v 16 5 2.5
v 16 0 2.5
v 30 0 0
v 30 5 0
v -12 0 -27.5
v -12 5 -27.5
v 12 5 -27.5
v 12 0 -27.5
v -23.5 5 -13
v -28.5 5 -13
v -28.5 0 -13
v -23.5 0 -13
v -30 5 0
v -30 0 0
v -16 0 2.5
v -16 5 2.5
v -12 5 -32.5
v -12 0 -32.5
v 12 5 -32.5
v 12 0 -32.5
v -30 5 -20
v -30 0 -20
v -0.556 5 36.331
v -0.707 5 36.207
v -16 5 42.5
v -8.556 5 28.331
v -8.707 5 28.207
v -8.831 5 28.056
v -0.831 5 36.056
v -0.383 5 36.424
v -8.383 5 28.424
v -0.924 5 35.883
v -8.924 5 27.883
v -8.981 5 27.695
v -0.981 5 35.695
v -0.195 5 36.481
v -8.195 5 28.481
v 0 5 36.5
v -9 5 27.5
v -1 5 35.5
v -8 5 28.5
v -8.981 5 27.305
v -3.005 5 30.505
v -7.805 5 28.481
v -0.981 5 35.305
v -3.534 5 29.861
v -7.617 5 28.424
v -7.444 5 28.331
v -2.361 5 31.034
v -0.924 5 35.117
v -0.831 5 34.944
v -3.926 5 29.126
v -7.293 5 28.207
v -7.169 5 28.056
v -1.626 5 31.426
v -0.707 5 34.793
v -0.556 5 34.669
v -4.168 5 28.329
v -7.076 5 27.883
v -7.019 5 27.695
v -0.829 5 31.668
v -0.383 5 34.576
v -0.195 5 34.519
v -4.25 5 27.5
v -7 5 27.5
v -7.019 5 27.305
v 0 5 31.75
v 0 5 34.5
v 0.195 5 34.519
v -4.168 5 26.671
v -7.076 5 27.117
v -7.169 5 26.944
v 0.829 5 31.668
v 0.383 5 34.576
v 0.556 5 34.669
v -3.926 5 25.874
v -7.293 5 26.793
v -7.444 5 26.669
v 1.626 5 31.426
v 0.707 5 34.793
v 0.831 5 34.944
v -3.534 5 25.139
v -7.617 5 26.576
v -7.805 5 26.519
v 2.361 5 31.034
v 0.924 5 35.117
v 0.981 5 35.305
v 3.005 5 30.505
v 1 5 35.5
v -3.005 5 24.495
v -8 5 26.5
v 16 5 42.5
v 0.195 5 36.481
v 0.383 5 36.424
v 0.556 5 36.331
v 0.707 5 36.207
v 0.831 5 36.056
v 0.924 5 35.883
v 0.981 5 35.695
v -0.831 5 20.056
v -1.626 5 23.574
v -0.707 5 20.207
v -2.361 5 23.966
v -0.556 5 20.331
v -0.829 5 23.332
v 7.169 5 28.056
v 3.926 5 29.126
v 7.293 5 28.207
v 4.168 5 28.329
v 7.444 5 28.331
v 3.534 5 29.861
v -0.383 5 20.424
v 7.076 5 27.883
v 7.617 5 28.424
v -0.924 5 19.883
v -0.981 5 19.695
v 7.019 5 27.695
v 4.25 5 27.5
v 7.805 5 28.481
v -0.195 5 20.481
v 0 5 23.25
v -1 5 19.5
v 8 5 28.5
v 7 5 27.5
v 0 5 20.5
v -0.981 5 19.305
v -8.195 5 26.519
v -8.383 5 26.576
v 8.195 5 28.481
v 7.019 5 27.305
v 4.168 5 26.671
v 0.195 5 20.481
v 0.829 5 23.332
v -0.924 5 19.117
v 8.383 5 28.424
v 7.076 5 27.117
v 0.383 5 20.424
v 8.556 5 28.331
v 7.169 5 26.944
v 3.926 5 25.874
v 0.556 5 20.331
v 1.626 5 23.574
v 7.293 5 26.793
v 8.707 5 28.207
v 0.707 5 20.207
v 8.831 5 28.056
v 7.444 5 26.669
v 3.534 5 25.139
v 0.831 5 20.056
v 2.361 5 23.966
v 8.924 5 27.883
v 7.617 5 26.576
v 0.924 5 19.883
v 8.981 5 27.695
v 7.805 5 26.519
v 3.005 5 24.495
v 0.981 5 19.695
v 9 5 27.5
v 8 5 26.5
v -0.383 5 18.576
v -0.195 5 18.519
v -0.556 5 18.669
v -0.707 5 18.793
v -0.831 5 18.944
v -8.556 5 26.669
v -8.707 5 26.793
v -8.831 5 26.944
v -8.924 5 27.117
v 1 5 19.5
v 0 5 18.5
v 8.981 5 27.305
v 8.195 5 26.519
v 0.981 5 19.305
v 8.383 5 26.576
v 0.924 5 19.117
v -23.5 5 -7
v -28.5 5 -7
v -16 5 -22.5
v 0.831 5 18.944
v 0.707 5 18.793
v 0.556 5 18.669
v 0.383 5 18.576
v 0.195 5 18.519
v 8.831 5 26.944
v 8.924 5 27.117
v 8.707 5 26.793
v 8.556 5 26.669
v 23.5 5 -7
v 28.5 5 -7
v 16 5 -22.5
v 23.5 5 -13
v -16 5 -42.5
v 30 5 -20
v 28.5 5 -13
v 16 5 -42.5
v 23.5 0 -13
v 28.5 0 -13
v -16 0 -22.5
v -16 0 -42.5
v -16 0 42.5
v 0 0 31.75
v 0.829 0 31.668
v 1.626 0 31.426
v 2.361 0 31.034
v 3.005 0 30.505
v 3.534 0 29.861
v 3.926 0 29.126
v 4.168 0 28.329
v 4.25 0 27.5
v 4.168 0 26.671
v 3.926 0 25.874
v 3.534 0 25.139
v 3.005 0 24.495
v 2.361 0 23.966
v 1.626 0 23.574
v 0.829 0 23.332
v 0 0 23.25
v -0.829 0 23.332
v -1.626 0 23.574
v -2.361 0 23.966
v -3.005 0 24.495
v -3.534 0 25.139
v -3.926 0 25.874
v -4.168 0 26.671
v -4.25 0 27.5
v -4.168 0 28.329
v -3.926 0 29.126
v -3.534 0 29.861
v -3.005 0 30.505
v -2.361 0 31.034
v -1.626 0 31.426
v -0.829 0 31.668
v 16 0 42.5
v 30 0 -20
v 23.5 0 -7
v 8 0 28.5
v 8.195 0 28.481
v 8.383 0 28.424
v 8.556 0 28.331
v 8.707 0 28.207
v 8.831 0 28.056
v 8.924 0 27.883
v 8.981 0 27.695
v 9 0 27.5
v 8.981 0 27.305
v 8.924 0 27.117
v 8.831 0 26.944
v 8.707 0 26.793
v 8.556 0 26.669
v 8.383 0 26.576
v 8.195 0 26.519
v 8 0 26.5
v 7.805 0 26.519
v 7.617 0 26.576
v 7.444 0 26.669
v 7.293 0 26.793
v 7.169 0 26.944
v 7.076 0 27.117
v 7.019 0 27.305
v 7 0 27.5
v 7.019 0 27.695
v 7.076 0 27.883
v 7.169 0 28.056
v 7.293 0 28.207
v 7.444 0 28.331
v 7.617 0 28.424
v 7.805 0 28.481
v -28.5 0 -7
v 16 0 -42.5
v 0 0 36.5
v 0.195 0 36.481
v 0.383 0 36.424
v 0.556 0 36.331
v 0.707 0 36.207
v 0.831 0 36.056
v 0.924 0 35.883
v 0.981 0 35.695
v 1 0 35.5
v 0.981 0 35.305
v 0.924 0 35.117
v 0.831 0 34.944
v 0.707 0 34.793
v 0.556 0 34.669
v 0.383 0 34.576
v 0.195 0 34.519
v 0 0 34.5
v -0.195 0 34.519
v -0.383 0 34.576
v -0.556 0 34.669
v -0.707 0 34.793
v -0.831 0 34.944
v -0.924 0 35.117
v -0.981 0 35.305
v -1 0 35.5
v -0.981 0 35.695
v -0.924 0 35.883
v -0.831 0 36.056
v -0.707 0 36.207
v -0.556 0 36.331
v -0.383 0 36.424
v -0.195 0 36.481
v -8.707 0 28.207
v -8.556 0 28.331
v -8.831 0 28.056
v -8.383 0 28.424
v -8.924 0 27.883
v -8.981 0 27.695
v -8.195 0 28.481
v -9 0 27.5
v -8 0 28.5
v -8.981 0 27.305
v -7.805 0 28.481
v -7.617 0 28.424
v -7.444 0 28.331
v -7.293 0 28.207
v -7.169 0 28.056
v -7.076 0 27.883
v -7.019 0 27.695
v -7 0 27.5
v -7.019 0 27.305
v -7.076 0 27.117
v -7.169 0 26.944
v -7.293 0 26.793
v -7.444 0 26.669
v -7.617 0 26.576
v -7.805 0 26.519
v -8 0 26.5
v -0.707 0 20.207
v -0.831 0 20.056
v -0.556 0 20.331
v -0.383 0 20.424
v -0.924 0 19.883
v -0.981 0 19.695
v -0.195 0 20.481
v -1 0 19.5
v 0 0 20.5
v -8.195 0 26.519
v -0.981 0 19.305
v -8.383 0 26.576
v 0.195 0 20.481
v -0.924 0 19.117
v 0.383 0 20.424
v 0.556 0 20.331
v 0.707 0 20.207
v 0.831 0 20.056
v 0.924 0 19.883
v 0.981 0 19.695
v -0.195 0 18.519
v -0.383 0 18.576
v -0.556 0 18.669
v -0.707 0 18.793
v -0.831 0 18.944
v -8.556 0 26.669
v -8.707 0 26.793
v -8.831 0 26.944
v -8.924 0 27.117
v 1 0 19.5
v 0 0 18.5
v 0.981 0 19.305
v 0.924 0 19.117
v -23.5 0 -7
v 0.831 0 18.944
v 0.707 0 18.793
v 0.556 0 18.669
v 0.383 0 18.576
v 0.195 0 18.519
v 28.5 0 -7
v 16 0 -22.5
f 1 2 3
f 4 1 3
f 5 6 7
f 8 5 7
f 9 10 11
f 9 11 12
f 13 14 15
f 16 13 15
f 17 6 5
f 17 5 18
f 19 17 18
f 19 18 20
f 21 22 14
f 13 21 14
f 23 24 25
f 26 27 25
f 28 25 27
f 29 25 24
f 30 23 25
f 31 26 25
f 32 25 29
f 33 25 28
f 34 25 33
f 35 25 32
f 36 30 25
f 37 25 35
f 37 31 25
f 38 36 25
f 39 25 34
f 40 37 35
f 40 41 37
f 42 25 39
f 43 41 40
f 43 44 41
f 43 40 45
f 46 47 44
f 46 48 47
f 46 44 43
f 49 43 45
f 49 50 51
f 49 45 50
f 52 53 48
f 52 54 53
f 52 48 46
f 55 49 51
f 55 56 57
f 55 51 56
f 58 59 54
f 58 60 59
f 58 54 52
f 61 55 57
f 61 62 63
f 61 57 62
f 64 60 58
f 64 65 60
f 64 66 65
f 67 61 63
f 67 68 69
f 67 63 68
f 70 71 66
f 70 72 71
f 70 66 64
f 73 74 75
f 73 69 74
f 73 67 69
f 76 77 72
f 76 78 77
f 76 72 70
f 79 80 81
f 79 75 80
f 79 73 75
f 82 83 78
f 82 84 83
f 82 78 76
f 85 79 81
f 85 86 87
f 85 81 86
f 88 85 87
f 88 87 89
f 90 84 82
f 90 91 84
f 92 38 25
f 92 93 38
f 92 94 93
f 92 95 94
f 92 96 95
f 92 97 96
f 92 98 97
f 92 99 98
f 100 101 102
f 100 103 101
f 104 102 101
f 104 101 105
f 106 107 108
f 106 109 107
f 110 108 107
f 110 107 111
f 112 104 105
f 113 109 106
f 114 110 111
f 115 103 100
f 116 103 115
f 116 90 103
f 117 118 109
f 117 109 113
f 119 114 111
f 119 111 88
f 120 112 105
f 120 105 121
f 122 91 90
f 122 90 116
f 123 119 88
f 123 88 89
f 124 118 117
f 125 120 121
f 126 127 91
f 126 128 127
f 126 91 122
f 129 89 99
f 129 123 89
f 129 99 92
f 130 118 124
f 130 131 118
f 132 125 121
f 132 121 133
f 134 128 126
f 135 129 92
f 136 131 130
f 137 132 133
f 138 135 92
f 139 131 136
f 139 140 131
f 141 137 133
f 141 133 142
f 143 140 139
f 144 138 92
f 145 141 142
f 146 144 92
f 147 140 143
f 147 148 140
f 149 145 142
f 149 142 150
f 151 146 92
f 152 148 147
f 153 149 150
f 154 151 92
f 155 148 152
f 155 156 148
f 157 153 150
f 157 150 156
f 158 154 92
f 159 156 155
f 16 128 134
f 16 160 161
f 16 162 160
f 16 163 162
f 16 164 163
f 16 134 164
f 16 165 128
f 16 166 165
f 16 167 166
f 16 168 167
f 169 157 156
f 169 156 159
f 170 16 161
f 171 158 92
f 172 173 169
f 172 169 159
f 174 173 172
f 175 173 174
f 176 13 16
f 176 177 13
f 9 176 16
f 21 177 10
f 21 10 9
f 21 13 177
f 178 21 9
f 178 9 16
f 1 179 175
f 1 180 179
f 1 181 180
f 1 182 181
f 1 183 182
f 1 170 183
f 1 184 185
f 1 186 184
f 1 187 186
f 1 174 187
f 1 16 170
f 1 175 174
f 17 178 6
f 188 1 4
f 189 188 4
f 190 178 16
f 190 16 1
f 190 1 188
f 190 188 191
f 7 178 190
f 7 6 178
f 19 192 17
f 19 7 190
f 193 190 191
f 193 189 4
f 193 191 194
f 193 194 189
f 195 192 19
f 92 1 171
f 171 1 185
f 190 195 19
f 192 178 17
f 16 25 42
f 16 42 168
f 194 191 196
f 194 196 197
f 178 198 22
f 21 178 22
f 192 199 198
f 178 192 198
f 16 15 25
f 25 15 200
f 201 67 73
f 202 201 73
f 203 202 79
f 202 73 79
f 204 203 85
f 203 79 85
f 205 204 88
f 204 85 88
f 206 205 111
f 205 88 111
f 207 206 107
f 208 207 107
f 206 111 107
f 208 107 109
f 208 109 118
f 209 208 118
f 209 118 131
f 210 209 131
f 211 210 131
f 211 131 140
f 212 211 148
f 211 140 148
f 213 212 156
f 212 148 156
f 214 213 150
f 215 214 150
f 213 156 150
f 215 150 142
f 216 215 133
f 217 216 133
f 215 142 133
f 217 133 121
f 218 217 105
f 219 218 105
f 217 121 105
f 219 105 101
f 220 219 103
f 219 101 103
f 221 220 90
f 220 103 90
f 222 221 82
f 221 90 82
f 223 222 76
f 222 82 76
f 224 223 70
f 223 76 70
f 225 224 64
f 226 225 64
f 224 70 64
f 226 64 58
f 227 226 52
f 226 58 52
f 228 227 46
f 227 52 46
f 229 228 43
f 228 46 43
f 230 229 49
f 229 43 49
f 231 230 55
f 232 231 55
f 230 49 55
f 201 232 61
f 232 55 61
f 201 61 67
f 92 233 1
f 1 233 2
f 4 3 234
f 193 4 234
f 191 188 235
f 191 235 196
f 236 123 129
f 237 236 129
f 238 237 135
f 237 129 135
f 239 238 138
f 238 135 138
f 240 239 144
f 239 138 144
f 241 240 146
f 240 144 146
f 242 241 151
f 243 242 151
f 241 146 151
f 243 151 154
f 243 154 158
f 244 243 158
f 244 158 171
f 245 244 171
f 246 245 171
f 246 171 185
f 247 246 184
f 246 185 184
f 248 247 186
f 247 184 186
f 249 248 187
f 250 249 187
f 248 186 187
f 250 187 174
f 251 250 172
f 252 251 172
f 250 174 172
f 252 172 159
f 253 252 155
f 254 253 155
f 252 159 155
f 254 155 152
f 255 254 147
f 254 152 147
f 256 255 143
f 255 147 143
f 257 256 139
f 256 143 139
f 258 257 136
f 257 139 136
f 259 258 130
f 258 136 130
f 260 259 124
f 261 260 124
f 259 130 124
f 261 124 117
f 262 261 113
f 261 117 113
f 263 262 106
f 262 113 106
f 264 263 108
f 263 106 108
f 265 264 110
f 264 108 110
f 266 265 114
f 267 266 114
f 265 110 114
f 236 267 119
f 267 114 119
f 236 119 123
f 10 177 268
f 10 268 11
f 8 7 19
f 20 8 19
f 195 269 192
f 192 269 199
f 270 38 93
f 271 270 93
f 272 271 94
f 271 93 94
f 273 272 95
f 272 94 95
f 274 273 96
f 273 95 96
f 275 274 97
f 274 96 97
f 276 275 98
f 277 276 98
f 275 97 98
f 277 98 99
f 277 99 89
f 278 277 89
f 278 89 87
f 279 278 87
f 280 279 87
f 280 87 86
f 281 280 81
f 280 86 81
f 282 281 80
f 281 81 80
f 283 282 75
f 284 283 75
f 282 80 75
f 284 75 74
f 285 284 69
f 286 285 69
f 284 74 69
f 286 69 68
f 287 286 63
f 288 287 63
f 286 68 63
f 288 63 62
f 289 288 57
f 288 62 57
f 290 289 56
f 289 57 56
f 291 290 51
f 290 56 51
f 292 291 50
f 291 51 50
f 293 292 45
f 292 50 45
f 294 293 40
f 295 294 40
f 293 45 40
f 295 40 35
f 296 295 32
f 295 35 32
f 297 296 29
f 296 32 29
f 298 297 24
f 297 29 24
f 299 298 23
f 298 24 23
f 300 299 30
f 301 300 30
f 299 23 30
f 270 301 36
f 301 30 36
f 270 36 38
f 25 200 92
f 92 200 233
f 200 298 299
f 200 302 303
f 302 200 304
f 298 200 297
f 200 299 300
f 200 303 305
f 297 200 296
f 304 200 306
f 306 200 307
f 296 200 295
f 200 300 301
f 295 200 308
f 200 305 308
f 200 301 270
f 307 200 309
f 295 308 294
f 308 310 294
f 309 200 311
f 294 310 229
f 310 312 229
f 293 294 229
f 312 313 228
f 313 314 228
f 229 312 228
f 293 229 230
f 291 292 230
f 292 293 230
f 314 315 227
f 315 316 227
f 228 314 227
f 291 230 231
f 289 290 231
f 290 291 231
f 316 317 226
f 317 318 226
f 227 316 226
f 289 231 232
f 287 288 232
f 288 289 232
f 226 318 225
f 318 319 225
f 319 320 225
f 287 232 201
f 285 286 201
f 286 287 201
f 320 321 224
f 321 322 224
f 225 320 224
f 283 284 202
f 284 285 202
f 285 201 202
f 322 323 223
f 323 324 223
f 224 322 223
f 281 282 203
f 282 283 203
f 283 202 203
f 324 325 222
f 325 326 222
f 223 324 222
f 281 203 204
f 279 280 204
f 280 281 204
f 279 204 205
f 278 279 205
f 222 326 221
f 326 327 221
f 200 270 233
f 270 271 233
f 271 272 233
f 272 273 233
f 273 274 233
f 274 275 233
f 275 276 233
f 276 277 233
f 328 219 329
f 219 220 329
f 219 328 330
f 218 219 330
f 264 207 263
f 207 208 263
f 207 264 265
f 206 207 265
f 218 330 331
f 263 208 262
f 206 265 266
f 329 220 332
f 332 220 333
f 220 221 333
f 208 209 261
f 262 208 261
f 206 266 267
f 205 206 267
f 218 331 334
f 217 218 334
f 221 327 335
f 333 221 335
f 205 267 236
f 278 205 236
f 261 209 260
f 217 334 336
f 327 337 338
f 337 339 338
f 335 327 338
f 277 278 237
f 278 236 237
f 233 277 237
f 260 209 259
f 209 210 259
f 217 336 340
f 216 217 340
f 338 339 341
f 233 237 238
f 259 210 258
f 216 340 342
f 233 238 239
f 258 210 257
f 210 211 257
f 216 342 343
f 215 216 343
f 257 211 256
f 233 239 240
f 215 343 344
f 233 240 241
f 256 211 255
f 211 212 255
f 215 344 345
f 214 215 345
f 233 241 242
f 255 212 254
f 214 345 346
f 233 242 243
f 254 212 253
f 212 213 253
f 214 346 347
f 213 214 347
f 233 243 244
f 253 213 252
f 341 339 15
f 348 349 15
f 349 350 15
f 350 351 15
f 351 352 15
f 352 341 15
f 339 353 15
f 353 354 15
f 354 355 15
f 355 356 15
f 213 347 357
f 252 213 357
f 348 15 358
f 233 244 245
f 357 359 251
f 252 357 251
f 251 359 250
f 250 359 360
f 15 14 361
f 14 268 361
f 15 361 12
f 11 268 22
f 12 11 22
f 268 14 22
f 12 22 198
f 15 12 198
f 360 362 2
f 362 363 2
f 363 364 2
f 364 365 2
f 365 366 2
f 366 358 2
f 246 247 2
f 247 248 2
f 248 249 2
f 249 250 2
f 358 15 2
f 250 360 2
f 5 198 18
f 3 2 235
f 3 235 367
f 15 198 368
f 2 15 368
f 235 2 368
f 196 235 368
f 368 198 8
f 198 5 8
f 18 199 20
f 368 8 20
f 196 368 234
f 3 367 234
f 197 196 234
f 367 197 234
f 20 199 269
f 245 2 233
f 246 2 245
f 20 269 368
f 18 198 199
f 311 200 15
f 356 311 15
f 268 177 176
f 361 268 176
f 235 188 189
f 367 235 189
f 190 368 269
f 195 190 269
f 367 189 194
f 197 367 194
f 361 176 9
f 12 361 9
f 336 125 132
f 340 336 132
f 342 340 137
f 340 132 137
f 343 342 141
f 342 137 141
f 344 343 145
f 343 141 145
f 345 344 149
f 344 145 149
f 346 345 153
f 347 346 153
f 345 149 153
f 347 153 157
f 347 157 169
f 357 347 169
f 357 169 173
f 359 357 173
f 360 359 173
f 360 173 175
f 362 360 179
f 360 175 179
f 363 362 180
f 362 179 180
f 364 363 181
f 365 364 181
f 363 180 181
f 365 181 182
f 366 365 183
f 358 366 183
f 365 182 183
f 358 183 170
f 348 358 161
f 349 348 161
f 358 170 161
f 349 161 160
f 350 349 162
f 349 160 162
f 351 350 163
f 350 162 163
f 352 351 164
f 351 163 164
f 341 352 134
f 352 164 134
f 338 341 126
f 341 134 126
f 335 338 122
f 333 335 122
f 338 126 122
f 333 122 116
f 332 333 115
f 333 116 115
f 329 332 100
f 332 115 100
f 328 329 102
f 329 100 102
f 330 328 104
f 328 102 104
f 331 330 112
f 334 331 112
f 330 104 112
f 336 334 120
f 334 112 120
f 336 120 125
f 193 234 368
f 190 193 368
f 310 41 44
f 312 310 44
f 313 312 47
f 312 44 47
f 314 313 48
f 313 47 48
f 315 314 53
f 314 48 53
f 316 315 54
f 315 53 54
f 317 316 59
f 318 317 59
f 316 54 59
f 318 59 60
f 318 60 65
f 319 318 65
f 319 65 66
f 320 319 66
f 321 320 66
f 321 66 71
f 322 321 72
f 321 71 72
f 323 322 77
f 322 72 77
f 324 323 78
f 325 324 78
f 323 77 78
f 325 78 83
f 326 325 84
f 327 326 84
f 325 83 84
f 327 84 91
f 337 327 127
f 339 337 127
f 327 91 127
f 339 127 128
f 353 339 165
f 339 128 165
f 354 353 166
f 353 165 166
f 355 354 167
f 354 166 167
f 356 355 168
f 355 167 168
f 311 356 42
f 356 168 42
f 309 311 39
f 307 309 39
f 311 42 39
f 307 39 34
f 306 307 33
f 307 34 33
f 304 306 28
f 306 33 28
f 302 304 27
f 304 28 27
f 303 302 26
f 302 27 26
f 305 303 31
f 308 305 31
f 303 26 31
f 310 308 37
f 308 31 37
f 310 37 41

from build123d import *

# Parameters (mm, degrees)
BOSS_EXTRUDE1_DEPTH = 5
SKETCH2_R           = 4.25
SKETCH2_R_2         = 1
SKETCH2_W           = 5
SKETCH2_H           = 6
SKETCH2_W_2         = 24
SKETCH2_H_2         = 5
CUT_EXTRUDE1_DEPTH  = 5


with BuildPart() as part:
    # Sketch1 → Boss-Extrude1 (new body)
    with BuildSketch(Plane(origin=(0, 0, 0), x_dir=(1, 0, 0), z_dir=(0, 1, 0))):
        Polygon((-16, -42.5), (16, -42.5), (16, -2.5), (30, 0), (30, 20), (16, 22.5), (16, 42.5), (-16, 42.5), (-16, 22.5), (-30, 20), (-30, 0), (-16, -2.5), align=None)
    extrude(amount=BOSS_EXTRUDE1_DEPTH)

    # Sketch2 → Cut-Extrude1 (cut)
    with BuildSketch(Plane(origin=(0, 5, 0), x_dir=(1, 0, 0), z_dir=(0, 1, 0))):
        with Locations(Location((0, -27.5, 0), (0, 0, 270))):
            Circle(SKETCH2_R)
        with Locations(Location((-8, -27.5, 0), (0, 0, 270))):
            Circle(SKETCH2_R_2)
        with Locations(Location((0, -19.5, 0), (0, 0, 270))):
            Circle(SKETCH2_R_2)
        with Locations(Location((8, -27.5, 0), (0, 0, 270))):
            Circle(SKETCH2_R_2)
        with Locations(Location((0, -35.5, 0), (0, 0, 270))):
            Circle(SKETCH2_R_2)
        with Locations((-26, 10)):
            Rectangle(SKETCH2_W, SKETCH2_H)
        with Locations((26, 10)):
            Rectangle(SKETCH2_W, SKETCH2_H)
        with Locations((0, 30)):
            Rectangle(SKETCH2_W_2, SKETCH2_H_2)
    extrude(amount=-CUT_EXTRUDE1_DEPTH, mode=Mode.SUBTRACT)


solid = part.part
